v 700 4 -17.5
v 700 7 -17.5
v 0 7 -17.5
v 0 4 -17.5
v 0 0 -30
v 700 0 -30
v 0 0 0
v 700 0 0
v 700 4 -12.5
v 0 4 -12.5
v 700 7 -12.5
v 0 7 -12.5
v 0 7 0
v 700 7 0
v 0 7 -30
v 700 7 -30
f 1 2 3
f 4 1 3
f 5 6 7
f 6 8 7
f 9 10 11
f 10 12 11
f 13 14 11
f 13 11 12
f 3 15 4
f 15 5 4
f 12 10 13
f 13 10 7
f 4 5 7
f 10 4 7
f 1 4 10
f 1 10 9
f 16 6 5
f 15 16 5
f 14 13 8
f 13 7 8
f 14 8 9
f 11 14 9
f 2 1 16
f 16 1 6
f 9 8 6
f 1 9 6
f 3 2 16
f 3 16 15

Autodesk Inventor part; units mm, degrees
ref_plane "YZ Plane" through (0, 0, 0) normal (1, 0, 0) x (0, 1, 0)
ref_plane "XZ Plane" through (0, 0, 0) normal (0, 1, 0) x (-1, 0, 0)
ref_plane "XY Plane" through (0, 0, 0) normal (0, 0, 1) x (1, 0, 0)
sketch "スケッチ1" plane through (0, 0, 0) normal (0, 1, 0) x (-1, 0, 0)
  line L0 (0, 0) -> (-700, 0)
  line L1 (-700, 0) -> (-700, -30)
  line L2 (-700, -30) -> (0, -30)
  line L3 (0, -30) -> (0, 0)
  dimension "d0" = 700
  dimension "d1" = 30
extrude "押し出し1" add sketch "スケッチ1" along normal blind 7
ref_plane "作業平面1" through (0, 7, 0) normal (0, 1, 0) x (1, 0, 0)
sketch "スケッチ2" plane through (0, 7, 0) normal (0, 1, 0) x (1, 0, 0)
  line L0 (0, 30) -> (0, 0) projected
  line L1 (0, 12.5) -> (700, 12.5)
  line L2 (700, 12.5) -> (700, 17.5)
  line L3 (700, 17.5) -> (0, 17.5)
  line L4 (0, 17.5) -> (0, 12.5)
  point P0 (0, 17.5)
  point P1 (0, 17.5)
  dimension "d5" = 5
  dimension "d6" = 700
  dimension "d7" = 5
extrude "押し出し2" cut sketch "スケッチ2" against normal blind 3
properties part number "guid"
